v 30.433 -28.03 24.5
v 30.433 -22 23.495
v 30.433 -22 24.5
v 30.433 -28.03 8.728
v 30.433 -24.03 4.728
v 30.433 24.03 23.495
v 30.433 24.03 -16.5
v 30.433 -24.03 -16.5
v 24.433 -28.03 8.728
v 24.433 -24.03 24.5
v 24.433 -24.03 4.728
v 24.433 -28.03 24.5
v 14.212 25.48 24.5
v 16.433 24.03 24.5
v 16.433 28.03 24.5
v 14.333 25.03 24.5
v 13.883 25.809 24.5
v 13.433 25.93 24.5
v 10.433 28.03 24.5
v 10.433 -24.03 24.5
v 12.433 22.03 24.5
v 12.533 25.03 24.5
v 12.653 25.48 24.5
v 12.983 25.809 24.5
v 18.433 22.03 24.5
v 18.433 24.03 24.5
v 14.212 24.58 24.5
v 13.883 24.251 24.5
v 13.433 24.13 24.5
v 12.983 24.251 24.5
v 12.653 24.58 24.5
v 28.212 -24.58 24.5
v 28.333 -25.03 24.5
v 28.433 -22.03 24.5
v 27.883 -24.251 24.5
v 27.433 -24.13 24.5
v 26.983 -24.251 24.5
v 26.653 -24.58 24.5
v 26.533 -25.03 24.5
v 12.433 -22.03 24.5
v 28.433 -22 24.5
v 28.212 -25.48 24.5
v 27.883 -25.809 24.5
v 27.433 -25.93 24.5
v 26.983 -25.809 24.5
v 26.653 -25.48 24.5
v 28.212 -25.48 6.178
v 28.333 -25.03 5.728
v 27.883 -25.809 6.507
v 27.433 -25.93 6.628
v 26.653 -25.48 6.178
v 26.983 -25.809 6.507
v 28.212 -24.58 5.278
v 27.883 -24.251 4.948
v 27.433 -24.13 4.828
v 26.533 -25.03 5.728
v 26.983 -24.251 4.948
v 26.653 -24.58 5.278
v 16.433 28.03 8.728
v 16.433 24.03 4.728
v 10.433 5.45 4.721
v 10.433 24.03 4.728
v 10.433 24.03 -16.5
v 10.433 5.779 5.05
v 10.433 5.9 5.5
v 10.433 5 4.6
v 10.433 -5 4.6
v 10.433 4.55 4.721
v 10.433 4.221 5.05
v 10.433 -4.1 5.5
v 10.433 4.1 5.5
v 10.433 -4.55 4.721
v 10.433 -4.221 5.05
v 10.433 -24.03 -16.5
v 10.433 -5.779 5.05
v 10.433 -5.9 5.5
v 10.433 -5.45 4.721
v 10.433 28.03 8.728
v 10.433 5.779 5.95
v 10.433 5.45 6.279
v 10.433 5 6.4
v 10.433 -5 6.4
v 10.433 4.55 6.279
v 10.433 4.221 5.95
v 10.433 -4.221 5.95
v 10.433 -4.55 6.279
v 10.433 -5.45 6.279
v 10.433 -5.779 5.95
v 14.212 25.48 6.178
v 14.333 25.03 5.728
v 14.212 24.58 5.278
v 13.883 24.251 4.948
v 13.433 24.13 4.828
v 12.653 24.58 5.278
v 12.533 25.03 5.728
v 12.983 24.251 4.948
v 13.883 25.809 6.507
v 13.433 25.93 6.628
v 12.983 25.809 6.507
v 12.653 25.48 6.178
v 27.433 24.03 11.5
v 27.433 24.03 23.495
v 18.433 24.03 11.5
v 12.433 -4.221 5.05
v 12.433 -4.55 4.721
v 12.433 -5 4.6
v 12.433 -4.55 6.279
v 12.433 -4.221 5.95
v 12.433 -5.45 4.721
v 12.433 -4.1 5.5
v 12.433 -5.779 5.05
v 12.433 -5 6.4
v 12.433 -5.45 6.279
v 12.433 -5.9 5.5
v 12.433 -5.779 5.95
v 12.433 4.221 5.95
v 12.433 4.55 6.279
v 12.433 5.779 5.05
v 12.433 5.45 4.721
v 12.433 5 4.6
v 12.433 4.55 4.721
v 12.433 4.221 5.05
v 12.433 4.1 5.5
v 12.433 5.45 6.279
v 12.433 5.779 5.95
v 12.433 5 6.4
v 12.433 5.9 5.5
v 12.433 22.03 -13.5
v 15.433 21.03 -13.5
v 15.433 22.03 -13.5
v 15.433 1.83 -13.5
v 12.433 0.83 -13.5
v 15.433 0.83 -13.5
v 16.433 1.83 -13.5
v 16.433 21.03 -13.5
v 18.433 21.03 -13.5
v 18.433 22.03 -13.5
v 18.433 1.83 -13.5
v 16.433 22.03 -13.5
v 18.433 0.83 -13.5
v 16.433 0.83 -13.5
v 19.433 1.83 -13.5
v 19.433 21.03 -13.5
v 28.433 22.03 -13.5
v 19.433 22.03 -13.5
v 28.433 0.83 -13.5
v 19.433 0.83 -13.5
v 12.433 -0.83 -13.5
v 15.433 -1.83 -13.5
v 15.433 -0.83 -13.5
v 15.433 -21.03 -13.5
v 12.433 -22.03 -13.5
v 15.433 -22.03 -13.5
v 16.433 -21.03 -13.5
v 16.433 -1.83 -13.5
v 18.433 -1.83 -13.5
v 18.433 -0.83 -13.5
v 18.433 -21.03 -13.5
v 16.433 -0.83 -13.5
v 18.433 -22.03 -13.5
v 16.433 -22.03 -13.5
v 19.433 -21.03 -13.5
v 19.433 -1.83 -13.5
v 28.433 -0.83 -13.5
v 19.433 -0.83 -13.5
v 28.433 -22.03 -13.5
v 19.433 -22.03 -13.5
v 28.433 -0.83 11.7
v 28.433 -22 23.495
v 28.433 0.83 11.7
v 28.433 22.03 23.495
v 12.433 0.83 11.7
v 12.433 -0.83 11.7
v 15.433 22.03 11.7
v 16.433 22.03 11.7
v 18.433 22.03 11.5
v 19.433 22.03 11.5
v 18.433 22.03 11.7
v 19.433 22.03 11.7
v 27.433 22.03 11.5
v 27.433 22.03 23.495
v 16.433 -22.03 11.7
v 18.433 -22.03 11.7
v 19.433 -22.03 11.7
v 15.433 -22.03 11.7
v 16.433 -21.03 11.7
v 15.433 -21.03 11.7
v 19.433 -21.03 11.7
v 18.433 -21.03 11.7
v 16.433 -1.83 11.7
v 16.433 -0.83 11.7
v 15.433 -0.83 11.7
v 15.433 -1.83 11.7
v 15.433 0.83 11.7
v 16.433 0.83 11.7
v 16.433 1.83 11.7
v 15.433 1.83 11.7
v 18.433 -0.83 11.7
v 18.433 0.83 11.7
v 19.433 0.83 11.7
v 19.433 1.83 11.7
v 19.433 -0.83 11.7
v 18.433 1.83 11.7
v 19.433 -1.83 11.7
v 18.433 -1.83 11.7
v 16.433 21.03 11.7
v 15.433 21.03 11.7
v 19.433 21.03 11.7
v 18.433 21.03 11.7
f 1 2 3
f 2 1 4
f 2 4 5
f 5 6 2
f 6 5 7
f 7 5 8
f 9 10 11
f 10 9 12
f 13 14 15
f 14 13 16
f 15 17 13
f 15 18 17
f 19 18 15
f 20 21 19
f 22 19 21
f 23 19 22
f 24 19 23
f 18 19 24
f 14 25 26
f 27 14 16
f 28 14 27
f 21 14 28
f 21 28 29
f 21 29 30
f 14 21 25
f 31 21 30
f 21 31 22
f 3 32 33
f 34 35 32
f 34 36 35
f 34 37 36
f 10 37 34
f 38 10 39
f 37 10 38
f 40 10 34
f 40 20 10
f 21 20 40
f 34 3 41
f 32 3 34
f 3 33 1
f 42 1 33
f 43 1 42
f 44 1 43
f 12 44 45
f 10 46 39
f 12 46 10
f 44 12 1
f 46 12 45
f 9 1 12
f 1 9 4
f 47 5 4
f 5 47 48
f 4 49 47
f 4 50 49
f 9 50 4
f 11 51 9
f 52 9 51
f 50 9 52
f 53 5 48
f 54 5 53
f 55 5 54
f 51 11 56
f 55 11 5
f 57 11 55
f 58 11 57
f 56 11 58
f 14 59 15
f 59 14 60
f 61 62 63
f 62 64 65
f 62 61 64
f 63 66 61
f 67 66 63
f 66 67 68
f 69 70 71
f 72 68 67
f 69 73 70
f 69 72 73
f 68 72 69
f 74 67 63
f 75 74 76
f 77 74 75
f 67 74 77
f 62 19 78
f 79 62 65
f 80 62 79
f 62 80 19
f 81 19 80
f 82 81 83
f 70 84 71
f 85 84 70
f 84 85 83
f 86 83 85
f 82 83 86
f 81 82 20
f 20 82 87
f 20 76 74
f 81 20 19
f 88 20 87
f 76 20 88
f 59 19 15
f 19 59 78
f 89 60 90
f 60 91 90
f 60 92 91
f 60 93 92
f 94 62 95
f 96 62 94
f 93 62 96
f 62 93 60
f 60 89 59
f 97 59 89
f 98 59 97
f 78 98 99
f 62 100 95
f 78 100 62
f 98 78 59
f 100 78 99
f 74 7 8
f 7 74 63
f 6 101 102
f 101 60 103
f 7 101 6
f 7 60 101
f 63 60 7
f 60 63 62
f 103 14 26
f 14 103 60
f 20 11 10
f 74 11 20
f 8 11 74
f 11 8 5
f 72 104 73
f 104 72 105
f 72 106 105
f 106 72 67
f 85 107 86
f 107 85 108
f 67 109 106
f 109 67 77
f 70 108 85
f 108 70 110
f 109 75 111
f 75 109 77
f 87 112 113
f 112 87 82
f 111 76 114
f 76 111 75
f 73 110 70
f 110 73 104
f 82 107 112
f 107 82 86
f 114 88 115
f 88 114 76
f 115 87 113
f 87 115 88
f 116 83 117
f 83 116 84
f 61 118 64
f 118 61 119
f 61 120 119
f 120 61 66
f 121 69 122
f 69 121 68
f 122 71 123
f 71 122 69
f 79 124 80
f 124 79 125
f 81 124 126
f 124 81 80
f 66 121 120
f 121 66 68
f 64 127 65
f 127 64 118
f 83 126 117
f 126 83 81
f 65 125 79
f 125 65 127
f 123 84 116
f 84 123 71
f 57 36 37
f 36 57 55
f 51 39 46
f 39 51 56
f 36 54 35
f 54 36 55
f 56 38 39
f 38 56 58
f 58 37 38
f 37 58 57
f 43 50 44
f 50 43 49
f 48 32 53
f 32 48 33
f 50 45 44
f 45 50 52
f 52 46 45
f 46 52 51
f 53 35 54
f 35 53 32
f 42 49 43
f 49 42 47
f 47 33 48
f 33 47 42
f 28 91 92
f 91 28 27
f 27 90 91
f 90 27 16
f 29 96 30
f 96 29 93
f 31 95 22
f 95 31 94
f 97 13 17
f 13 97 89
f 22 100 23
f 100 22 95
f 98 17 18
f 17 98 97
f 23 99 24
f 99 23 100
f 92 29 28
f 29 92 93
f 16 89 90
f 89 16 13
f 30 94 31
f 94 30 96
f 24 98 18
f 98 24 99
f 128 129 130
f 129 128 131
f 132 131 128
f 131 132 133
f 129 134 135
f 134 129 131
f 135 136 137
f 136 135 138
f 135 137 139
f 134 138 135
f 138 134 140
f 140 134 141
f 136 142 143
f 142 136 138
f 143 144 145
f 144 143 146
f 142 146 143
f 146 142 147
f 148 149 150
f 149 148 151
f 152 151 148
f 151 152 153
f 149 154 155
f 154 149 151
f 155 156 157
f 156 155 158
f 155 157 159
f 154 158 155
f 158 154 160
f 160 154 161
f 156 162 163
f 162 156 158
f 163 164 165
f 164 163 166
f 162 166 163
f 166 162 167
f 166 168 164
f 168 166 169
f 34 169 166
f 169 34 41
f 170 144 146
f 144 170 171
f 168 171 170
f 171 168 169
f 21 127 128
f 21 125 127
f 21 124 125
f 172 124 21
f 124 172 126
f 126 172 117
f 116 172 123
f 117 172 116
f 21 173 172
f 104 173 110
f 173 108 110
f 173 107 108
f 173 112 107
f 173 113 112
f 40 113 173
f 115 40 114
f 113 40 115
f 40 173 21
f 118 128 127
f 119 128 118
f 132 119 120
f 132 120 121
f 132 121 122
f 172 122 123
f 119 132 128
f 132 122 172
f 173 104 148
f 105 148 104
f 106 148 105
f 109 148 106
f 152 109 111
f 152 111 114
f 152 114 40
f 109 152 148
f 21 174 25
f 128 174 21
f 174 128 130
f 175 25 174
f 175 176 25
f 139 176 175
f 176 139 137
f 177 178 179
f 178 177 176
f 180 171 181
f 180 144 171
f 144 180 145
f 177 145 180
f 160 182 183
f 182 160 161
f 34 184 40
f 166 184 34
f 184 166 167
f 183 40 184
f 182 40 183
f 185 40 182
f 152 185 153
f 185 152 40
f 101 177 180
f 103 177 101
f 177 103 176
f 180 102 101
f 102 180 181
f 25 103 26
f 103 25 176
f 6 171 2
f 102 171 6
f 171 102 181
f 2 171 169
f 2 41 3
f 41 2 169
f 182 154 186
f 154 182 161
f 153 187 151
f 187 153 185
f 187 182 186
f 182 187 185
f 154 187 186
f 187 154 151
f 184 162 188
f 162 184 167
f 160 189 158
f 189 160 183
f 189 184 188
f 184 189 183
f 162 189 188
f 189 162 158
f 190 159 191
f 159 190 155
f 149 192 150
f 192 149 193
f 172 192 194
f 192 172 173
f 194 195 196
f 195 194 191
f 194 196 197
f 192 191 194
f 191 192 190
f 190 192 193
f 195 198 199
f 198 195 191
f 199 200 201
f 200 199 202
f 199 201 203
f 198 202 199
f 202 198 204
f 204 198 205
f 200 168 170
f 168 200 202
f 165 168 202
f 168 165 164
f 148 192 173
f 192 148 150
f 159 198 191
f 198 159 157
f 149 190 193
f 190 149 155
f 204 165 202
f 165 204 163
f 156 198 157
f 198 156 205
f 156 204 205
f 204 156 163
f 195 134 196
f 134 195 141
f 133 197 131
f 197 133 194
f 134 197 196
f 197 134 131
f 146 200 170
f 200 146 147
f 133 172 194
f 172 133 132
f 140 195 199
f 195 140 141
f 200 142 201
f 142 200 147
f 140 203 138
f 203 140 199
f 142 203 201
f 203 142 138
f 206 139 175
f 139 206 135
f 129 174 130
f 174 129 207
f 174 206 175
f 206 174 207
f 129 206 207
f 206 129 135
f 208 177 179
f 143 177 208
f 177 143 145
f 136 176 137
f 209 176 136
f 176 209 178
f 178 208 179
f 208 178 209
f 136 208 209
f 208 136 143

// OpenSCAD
stand_l=200; // length
stand_w=143; // width
stand_t=13.5;  // thickness

mudguard_w=40;
mudguard_t=5;

hold_l = stand_w+12; // 1mm space on each side
hold_w = 25;
hold_t = 4;
hold_holedist = 30*2.54; // pcb hole mount
hold_pcbside = 20; // move PCB on a side
hold_batside = -57;

bat_up = 43; // move bat up/down
bat_dim = [92,43,22.1]; // battery dimensions

bat_hold_t = 2; // thickness of bat holder
bat_hold_d = [40,40]; // depth of bat holder rear,front
bat_hold_back = [-7,-17]+(bat_hold_d-[18,40])/2; // move holder back: rear,front

bat_screw_d1 = 5;
bat_screw_d2 = 9;
bat_screw_h  = 3;
bat_screw_dist = 18; // distance between 2 screws

bat_clr = [0.5,0.5,0.5]; // from each side
bat_cut = [99,30,12]; // cut for connector
bat_btn_d = 28; // cut for button
bat_btn_x = 19; // position from edge

bat_charger_dim=[9,9]; // connector cut
bat_charger_pos=[9,-1]; // connector center position

hold_holes = [hold_pcbside-hold_holedist/2,hold_pcbside+hold_holedist/2, hold_batside+bat_screw_dist/2, hold_batside-bat_screw_dist/2]; // list of holes position relative to center

// bar
hold_sh  = 3.5; // spacer height
hold_sd1 = 5; // spacer diameter top
hold_sd2 = 7.5; // spacer diameter bot

// plate grips
grip_a = 3; // anti-rotate thick
grip_b = 5; // anti-rotate len
grip_w = hold_w+2*grip_a+0.4;
grip_w0 = 5;
grip_h = stand_t;
grip_l = 12;
grip_t = 5;

screw_hhead = 2.5;
screw_dhead = 5;
screw_thru  = 2.7;
screw_in    = 1.8;

mgrip_x  = 0; // position more back
mgrip_z  = 50; // position up grip

mgrip_d1 = 18.5; // mudguard grip dia
mgrip_d2 = 25; // mudguard grip dia
mgrip_h  = 11; // mudguard total height
mgrip_ht =5.5; // mudguard grip top height (hook thickness)
mgrip_depth = 11; // mudguard cut depth
mgrip_hspace = 5; // mudguard space
mgrip_angle = 22; // about 22 deg

mgrip_hold_t = 3; // mgrip holder thickness
mgrip_screw_depth = 8.5; // depth of 2 screws for mounting to the box
mgrip_hold_h = 11.5; // holder height
mgrip_hold_clr = 0.2; // mgrip holder clearance form each side
mgrip_hole_h = 8.4; // M3 tightening hole pos from top
mgrip_hole_x = 3.5; // move holes front
mgrip_hole_d = 3.5; // M3 thru dia

//sensor_pcb  = [20.4,20.4,1.6]; // xyz pcb size ADXL355
sensor_pcb  = [25.4,20.4,1.6]; // xyz pcb size ADXRS290

sensor_conn_dim = [12.5,6,55.5]; // ADXRS290
sensor_dist = 2.54*9;
sensor_clr  = [0.4, 0.4, 0.2]; // sensor xyz clearance in the box 0.2 - very tight

sensor_rail_w = 1; // sensor rail width
sensor_rail_z = -3; // sensor rail up/down

box_t = 2; // box wall thickness
box_x = -4; // move box x relative to holder
box_cover_screw_w = 6; // width of screw holder for the cover

mgrip_box_internal = [sensor_pcb[0]+sensor_conn_dim[0]+sensor_clr[0]+0.7,sensor_pcb[1]+sensor_dist+2*sensor_clr[1],16];

mgrip_box_dim = mgrip_box_internal+[box_t,box_t*2,box_t*2];

mgrip_screw_dist = 5; // screw holes distance for mgrip mounting
mgrip_screw_x = -5.5; // x-offset screw holes
mgrip_screw_h = 3; // screw depth

module stand()
{
  cube([stand_l,stand_w,stand_t], center=true);
  translate([stand_l/2,0,0])
    cylinder(d=stand_w,h=stand_t,center=true);
  translate([stand_l/2,0,stand_t/2+mudguard_t/2])
    cylinder(d=mudguard_w,h=mudguard_t,center=true);
}

module mgrip()
{
  dist = mgrip_d2-mgrip_d1;
  rotate([0,-mgrip_angle,0])
  difference()
  {
  union()
  {
  for(i=[-1:2:1])
    translate([-i*dist/2,0,0])
      cylinder(d=mgrip_d1,h=mgrip_h,$fn=24,center=true);
  cube([dist,mgrip_d1,mgrip_h],center=true);
  }
    // cut inside
    translate([-mgrip_d2+mgrip_depth,0,mgrip_h/2-mgrip_hspace/2-mgrip_ht])
      cube([mgrip_d2+0.01,mgrip_d1+0.01,mgrip_hspace],center=true);
  }
}

module battery()
{
  cube(bat_dim,center=true);
}

// j=0 no button opening
// j=1 button opening
module bat_holder(j)
{
  translate([bat_hold_back[j],0,0])
  difference()
  {
    union()
    {
      // outer shell
      cube([bat_hold_d[j]+bat_hold_t*2,bat_dim[1]+bat_hold_t*2,bat_dim[2]+bat_hold_t*2]+bat_clr*2,center=true);
      // screw mount
      for(i=[-1:2:1])
        translate([-bat_hold_back[j],-bat_dim[2]-bat_hold_t-bat_screw_h+0.01,i*bat_screw_dist/2])
        rotate([-90,0,0])
        cylinder(d1=bat_screw_d1,d2=bat_screw_d2,h=bat_screw_h,$fn=24);
    }
    // cut for battery fit
    translate([bat_dim[0]/2-bat_hold_d[j]/2,0,0])
    cube(bat_dim+bat_clr*2,center=true);
    // cut for connector
    translate([0,0,0])
      cube(bat_cut,center=true);
    // cut for charger
    if(j > 0.5) // only on front side
    translate([-bat_hold_d[j]/2+bat_charger_dim[0]/2+bat_charger_pos[0],bat_dim[1]/2,bat_charger_pos[1]])
    {
      cube([bat_charger_dim[0],bat_dim[1]/2,bat_charger_dim[1]],center=true);
      // print-friendly circles
      for(k=[-1:2:1])
      translate([k*bat_charger_dim[0]/2,0,0])
        rotate([90,0,0])
          cylinder(d=bat_charger_dim[1],h=bat_dim[1]/2,$fn=12,center=true);
    }
    // cut for screw
    for(i=[-1:2:1])
      translate([-bat_hold_back[j],-bat_dim[1]/2,i*bat_screw_dist/2])
      rotate([-90,0,0])
        cylinder(d=screw_in,h=bat_dim[1]/2,$fn=12,center=true);
    // cut for button
    translate([bat_btn_x-bat_hold_d[j]/2,0,-j*bat_dim[2]/2])
    {
      // circular
      rotate([0,0,0])
        cylinder(d=bat_btn_d,h=bat_hold_t*5,$fn=48,center=true);
      // straight
      translate([bat_btn_d/2,0,0])
        cube([bat_btn_d,bat_btn_d,bat_hold_t*5],center=true);
    }
  }
}

module holder_grip()
{
  difference()
  {
  union()
  {
  cube([grip_w, grip_w0, grip_h],center=true);
  translate([0,grip_w0/2-grip_l/2,-grip_h/2-grip_t/2])
    cube([grip_w,grip_l,grip_t],center=true);
  translate([grip_w/2-grip_a/2,grip_w0/2-grip_b/2,grip_h/2+hold_t/2])
    cube([grip_a,grip_b,hold_t],center=true);
  translate([-grip_w/2+grip_a/2,grip_w0/2-grip_b/2,grip_h/2+hold_t/2])
    cube([grip_a,grip_b,hold_t],center=true);
  }
  cylinder(d=screw_in,h=grip_h*10,$fn=12,center=true);
  }
}

module spacer(h)
{
  difference()
  {
    cylinder(d=6,h=h,$fn=12,center=true);
    cylinder(d=screw_thru,h=h+0.01,$fn=12,center=true);
  }
}

module holder_bar()
{
  difference()
  {
    union()
    {
      cube([hold_w,hold_l,hold_t],  center=true);
      // reinforcement spacers
        for(i=[0:1:3])
          translate([0,hold_holes[i],hold_t/2+hold_sh/2])
        cylinder(d2=hold_sd1,d1=hold_sd2,h=hold_sh,$fn=24,center=true);
            //cube([hold_w,hold_w,hold_t], center=true);
    }
    // grip holes
    for(i=[-1:2:1])
    translate([0,i*(hold_l/2-grip_w0/2),0])
      cylinder(d=screw_thru,h=hold_t*2,$fn=12,center=true);
    // pcb holes
    
    for(i=[0:1:3])
    translate([0,hold_holes[i],0])
    {
      // main hole
      cylinder(d=screw_thru,h=hold_t*10,$fn=12,center=true  );
      // head space
      translate([0,0,-hold_t/2+screw_hhead/2])
        cylinder(d=screw_dhead,h=screw_hhead+0.01,$fn=12,center=true);
      // conical transition
      translate([0,0,-hold_t/2+screw_hhead])
       cylinder(d1=screw_dhead,d2=0,h=screw_dhead*0.7+0.01,$fn=12,center=false);
    }
  }
}

module mgrip_holder()
{
  dist = mgrip_d2-mgrip_d1;
  add_h = tan(mgrip_angle)*(mgrip_d2+mgrip_hold_t*2+mgrip_hold_clr*2);
  // sensors box
  difference()
  {
  union()
  {
  rotate([0,-mgrip_angle,0])
    difference()
    {
      if(1)
      union()
      {
        for(i=[-1:2:1])
        translate([i*dist/2,0,add_h/2])
        cylinder(d=mgrip_d1+2*mgrip_hold_clr+2*mgrip_hold_t,h=mgrip_hold_h+add_h,center=true);
        translate([0,0,add_h/2])
        cube([dist,mgrip_d1+2*mgrip_hold_clr+2*mgrip_hold_t,mgrip_hold_h+add_h],center=true);
      }
      // internal cut
      for(i=[-1:2:1])
        translate([i*dist/2,0,0])
          cylinder(d=mgrip_d1+2*mgrip_hold_clr,h=mgrip_hold_h+0.01,center=true);
      cube([dist,mgrip_d1+2*mgrip_hold_clr,mgrip_hold_h+0.01],center=true);
      // scew holes
      translate([-mgrip_hole_x,0,mgrip_hold_h/2-mgrip_hole_h])
        rotate([90,0,0])
          cylinder(d=mgrip_hole_d,h=100,$fn=12,center=true);
    }
  }
    // screws cut
    for(i=[-1:2:1])
      translate([mgrip_screw_x,i*mgrip_screw_dist,0])
      {
        // thru hole
        cylinder(d=screw_thru,h=100,$fn=12,center=true);
        // head
        translate([0,0,mgrip_screw_depth])
        {
        rotate([180,0,0])
        {
        cylinder(d2=screw_dhead,d1=0,h=(screw_dhead)/2,$fn=12, center=false);
        translate([0,0,screw_dhead/2-0.01])
        cylinder(d=screw_dhead,h=10,$fn=12,center=false);
        }
        }
      }
    // box cut
    translate([0,0,mgrip_box_dim[2]/2+mgrip_hold_h/2+sin(mgrip_angle)*mgrip_d2/2])
    cube(mgrip_box_dim+[10,10,0],center=true);
  }
}

module mgrip_box()
{
  dist = mgrip_d2-mgrip_d1;
  add_h = tan(mgrip_angle)*(mgrip_d2+mgrip_hold_t*2+mgrip_hold_clr*2);
  box_translate = [box_x,0,mgrip_box_dim[2]/2+mgrip_hold_h/2+sin(mgrip_angle)*mgrip_d2/2];
  //cover_screw_translate = [0,i*(mgrip_box_dim[1]/2),-mgrip_box_dim[2]/2+box_cover_screw_w/2];
  // sensors box
  difference()
  {
    translate(box_translate)
    {
      cube(mgrip_box_dim,center=true);
      // side screw mounts
      for(i=[-1:2:1])
      translate([0,i*(mgrip_box_dim[1]/2+box_t/2),-i*mgrip_box_dim[2]/2+i*box_cover_screw_w/2])
      difference()
      {
        cube([mgrip_box_dim[0],box_cover_screw_w,box_cover_screw_w],center=true);
        // angular cuts for print friendly
        translate([11,0,0])
        rotate([0,0,-i*45])
          cube([100,18,18],center=true);
        // holes for screws
        //rotate([0,90,0])
        //cylinder(d=screw_in,h=100,$fn=12,center=true);
      }
    }
    // box interior
    translate(box_translate+[-box_t,0,0])
      cube(mgrip_box_internal+[0,0,0],center=true);
    // screws cut
    for(i=[-1:2:1])
      translate([mgrip_screw_x,i*mgrip_screw_dist,mgrip_box_dim[2]/2])
        // thru hole
        cylinder(d=screw_in,h=mgrip_box_dim[2],$fn=12,center=true);
    // connector out cut
    translate(box_translate+[-15,20,2.5 ])
      cube([15,10,9],center=true);
    // cut for cable
    translate(box_translate+[/*-17.5*/ -mgrip_box_internal[0]/2-0.5 ,28,9])
      cube([1.01,100,5],center=true);
    // cut for cover screws
    for(i=[-1:2:1])
      translate(box_translate+[0,i*(mgrip_box_dim[1]/2+box_t/2),-i*mgrip_box_dim[2]/2+i*box_cover_screw_w/2])
        // holes for screws
        rotate([0,90,0])
        cylinder(d=screw_in,h=100,$fn=12,center=true);

  }
  translate(box_translate)
    {
      inx = 5; // todo find parameters
      // wall between sensors
      translate([inx,0,0])
        cube([sensor_pcb[0],sensor_dist-sensor_pcb[1]-2*sensor_clr[1],mgrip_box_dim[2]],center=true);
      for(i=[-1:2:1]) // left/right sensor
      // rails for pcb
      for(j=[-1:2:1]) // left/right edges
      for(k=[-1:2:1]) // up/down edges
      translate([inx,i*sensor_dist/2+j*(sensor_pcb[1]+2*sensor_clr[1]-1*sensor_rail_w)/2,sensor_rail_z+k*(sensor_pcb[2]+sensor_rail_w+2*sensor_clr[2])/2])
        cube([sensor_pcb[0],sensor_rail_w,sensor_rail_w],center=true);
    }
}

module mgrip_box_cover()
{
  dist = mgrip_d2-mgrip_d1;
  add_h = tan(mgrip_angle)*(mgrip_d2+mgrip_hold_t*2+mgrip_hold_clr*2);
  box_translate = [box_x,0,mgrip_box_dim[2]/2+mgrip_hold_h/2+sin(mgrip_angle)*mgrip_d2/2];

    difference()
    {
      translate(box_translate+[-22,0,0])
      {
      cube([box_t,mgrip_box_dim[1],mgrip_box_dim[2]],center=true);
      for(i=[-1:2:1])
        translate([0,i*(mgrip_box_dim[1]+box_t)/2,-i*mgrip_box_dim[2]/2+i*box_cover_screw_w/2])
            cube([box_t,box_cover_screw_w,box_cover_screw_w],center=true);
      }
      // cut for screw
      for(i=[-1:2:1])
        translate(box_translate+[-22,0,0])
          translate([0,i*(mgrip_box_dim[1]+box_t)/2,-i*mgrip_box_dim[2]/2+i*box_cover_screw_w/2])
            rotate([0,90,0])
              cylinder(d=screw_thru,h=100,$fn=12,center=true);

    }
}


module sensors()
{
  for(i = [-1:2:1])
    translate([0,i*sensor_dist/2,0])
      cube(sensor_pcb,center=true);
}

module assembly()
{
  %stand();
  translate([37,hold_batside,bat_up])
    rotate([90,0,0])
    %battery();
  translate([stand_l/2+mgrip_x,0,mgrip_z])
    %mgrip();
  translate([stand_l/2+mgrip_x,0,mgrip_z]+[2,0,17.5])
    %sensors();
  translate([stand_l/2+mgrip_x,0,mgrip_z])
    {
      mgrip_holder();
      mgrip_box();
    }
  translate([0,0,stand_t/2+hold_t/2])
  {
    holder_bar();
    translate([0,hold_l/2-grip_w0/2,-hold_t/2-grip_h/2])
      holder_grip();
    translate([0,-hold_l/2+grip_w0/2,-hold_t/2-grip_h/2])
      rotate([0,0,180])
        holder_grip();
  }
  // battery holder
  translate([0,hold_batside,bat_up])
    rotate([90,0,0])
    bat_holder(0);
}

module print_bar()
{
  holder_bar();
}

module print_grip()
{
  rotate([-90,0,0])
  holder_grip();
}

module print_bat(j)
{
  rotate([0,-90,0])
    bat_holder(j);
}

module print_box_holder()
{
  rotate([180,0,0])
  mgrip_holder();
}

module print_box()
{
  rotate([0,90,0])
    mgrip_box();
}

module print_box_cover()
{
  rotate([0,90,0])
    mgrip_box_cover();
}

//assembly();
//print_bar();
//print_grip();
//print_bat(0); // batt_rear
//print_bat(1); // batt_front
//print_box_holder();
print_box();
//print_box_cover();
//spacer(2);

// some debug assys
//mgrip_box();
//mgrip_box_cover();
//mgrip_holder();

// check angle
//if(0)
//difference()
//{
//  mgrip_box();
//  translate([0,50,0])
//    cube([100,100,100],center=true);
//}
